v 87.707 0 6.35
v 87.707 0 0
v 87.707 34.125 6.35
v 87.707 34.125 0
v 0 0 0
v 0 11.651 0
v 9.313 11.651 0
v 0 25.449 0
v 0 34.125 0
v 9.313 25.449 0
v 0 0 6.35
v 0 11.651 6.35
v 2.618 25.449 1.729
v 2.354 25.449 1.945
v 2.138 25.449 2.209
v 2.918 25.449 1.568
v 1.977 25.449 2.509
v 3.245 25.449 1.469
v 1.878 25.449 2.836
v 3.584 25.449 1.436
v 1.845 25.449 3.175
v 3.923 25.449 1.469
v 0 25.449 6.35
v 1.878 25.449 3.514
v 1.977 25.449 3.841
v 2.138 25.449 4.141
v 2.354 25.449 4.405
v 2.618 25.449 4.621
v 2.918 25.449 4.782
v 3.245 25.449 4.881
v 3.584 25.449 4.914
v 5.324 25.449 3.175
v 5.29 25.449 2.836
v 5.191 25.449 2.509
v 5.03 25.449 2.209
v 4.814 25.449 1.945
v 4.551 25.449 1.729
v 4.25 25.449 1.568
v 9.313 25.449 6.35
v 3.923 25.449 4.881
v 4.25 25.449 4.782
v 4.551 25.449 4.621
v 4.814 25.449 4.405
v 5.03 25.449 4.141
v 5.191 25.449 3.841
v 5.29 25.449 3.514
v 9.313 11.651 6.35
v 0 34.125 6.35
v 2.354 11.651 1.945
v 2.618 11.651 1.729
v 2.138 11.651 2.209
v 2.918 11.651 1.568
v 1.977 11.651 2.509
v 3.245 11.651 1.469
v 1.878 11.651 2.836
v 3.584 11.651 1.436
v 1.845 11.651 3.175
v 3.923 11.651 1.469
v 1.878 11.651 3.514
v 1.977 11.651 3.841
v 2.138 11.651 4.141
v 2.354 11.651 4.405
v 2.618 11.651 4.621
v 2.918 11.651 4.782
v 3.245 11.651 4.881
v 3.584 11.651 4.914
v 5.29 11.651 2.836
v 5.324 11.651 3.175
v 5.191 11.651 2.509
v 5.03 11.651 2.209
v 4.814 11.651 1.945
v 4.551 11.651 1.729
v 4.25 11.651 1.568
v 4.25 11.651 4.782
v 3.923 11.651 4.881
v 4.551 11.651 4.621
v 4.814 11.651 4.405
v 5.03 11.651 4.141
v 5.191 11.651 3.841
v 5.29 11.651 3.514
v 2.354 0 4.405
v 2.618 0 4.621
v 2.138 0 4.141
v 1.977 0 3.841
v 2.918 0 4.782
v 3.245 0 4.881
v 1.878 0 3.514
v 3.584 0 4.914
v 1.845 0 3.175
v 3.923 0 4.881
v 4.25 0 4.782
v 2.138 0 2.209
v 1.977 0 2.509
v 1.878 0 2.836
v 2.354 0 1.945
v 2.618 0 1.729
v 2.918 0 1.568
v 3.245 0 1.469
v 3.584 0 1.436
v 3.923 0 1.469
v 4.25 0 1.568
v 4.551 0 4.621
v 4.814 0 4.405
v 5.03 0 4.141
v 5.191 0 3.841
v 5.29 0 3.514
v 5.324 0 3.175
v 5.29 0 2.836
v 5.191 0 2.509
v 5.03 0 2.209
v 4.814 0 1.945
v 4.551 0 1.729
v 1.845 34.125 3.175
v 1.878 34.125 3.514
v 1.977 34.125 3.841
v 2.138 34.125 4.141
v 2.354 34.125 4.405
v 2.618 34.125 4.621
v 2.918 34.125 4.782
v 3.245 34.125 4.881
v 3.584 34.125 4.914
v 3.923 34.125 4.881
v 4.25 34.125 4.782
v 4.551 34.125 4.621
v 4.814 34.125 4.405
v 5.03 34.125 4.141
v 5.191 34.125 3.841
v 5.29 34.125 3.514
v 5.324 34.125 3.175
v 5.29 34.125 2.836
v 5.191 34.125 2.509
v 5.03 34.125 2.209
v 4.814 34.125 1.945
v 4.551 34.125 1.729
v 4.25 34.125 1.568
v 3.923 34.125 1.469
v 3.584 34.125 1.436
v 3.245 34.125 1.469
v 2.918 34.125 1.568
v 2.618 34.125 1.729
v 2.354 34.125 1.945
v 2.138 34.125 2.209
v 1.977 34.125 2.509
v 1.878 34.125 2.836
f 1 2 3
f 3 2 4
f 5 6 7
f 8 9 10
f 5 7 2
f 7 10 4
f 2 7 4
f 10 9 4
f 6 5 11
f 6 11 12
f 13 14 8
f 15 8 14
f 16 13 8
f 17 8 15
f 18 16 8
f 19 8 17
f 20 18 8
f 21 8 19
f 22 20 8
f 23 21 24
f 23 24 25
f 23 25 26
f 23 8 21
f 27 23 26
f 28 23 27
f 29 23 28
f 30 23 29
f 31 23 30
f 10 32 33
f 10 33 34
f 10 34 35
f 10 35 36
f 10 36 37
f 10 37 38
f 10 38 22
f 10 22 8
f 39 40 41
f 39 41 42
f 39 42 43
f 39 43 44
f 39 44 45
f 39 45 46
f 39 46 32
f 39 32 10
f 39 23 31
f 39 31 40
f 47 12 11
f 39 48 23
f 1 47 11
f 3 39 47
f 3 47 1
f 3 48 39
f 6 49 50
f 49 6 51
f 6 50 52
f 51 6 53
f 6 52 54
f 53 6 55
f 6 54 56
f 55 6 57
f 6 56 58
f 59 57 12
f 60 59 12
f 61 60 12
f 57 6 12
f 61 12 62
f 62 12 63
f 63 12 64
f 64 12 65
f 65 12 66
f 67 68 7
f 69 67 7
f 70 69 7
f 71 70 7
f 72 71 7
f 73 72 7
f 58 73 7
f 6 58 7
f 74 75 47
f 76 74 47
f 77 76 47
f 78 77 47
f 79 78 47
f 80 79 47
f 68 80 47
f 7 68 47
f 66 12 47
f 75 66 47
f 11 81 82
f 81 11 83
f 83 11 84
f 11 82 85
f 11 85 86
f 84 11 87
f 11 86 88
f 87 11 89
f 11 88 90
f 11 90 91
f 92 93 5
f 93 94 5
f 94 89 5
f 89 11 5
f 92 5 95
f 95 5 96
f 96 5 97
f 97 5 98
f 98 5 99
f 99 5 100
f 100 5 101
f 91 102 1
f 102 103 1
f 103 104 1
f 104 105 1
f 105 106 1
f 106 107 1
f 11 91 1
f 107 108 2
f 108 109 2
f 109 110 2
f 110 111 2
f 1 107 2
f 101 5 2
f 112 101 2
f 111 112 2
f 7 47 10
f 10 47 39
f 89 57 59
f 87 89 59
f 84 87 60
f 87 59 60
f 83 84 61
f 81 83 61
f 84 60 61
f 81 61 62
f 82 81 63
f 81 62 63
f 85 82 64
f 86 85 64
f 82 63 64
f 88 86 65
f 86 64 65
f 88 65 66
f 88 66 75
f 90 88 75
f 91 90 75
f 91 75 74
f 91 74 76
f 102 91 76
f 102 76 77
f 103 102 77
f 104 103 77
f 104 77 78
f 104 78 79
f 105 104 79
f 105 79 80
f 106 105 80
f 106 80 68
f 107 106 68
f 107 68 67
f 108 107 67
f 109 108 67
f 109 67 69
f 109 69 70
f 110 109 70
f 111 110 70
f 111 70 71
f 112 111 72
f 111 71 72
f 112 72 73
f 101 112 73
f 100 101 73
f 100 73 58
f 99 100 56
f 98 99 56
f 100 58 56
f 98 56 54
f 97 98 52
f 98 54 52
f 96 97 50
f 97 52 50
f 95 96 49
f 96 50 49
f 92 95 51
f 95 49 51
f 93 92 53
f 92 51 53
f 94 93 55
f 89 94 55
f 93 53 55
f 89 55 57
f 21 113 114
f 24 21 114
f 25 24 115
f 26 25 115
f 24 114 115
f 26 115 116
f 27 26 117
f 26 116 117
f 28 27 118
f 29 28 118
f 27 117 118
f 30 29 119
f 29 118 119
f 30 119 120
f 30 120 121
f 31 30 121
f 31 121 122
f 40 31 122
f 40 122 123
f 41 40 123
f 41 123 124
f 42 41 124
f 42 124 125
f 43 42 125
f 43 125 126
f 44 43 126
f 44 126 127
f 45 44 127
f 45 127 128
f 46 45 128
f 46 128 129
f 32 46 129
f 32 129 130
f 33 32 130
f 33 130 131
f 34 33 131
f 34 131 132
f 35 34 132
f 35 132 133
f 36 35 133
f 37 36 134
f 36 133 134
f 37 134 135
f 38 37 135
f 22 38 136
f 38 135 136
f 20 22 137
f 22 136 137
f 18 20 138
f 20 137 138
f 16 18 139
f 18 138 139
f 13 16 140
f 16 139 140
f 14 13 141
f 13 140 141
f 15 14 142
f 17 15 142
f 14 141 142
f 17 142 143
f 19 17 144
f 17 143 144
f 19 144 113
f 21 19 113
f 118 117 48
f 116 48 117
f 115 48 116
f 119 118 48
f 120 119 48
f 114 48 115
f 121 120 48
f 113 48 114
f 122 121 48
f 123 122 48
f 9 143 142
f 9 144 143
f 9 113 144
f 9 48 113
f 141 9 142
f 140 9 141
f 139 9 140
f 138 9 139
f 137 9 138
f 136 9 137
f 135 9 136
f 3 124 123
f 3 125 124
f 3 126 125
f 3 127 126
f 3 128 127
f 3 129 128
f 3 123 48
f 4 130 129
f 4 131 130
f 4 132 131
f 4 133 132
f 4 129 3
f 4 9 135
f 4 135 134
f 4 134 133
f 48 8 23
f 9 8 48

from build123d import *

# Parameters (mm, degrees)
F0_W     = 87.707184
F0_H     = 34.12497
F1_DEPTH = 6.35
F2_W     = 9.312924
F2_H     = 13.797991
F3_DEPTH = 6.35
F4_R     = 1.73945
F5_DEPTH = 34.12497


with BuildPart() as f1:
    # F0 (on Top) → F1 (new body)
    with BuildSketch(Plane.XY):
        with Locations((43.853592, 17.062485)):
            Rectangle(F0_W, F0_H)
    extrude(amount=F1_DEPTH)

    # F2 (on face) → F3 (cut, through all)
    with BuildSketch(Plane.XY.offset(6.35)):
        with Locations((4.656462, 18.549588)):
            Rectangle(F2_W, F2_H)
    extrude(amount=-F3_DEPTH, mode=Mode.SUBTRACT)

    # F4 (on face) → F5 (cut, through all)
    with BuildSketch(Plane(origin=(0, 34.12497, 0), x_dir=(-1, 0, 0), z_dir=(0, 1, 0))):
        with Locations((-3.584127, 3.175)):
            Circle(F4_R)
    extrude(amount=-F5_DEPTH, mode=Mode.SUBTRACT)


solid = f1.part
